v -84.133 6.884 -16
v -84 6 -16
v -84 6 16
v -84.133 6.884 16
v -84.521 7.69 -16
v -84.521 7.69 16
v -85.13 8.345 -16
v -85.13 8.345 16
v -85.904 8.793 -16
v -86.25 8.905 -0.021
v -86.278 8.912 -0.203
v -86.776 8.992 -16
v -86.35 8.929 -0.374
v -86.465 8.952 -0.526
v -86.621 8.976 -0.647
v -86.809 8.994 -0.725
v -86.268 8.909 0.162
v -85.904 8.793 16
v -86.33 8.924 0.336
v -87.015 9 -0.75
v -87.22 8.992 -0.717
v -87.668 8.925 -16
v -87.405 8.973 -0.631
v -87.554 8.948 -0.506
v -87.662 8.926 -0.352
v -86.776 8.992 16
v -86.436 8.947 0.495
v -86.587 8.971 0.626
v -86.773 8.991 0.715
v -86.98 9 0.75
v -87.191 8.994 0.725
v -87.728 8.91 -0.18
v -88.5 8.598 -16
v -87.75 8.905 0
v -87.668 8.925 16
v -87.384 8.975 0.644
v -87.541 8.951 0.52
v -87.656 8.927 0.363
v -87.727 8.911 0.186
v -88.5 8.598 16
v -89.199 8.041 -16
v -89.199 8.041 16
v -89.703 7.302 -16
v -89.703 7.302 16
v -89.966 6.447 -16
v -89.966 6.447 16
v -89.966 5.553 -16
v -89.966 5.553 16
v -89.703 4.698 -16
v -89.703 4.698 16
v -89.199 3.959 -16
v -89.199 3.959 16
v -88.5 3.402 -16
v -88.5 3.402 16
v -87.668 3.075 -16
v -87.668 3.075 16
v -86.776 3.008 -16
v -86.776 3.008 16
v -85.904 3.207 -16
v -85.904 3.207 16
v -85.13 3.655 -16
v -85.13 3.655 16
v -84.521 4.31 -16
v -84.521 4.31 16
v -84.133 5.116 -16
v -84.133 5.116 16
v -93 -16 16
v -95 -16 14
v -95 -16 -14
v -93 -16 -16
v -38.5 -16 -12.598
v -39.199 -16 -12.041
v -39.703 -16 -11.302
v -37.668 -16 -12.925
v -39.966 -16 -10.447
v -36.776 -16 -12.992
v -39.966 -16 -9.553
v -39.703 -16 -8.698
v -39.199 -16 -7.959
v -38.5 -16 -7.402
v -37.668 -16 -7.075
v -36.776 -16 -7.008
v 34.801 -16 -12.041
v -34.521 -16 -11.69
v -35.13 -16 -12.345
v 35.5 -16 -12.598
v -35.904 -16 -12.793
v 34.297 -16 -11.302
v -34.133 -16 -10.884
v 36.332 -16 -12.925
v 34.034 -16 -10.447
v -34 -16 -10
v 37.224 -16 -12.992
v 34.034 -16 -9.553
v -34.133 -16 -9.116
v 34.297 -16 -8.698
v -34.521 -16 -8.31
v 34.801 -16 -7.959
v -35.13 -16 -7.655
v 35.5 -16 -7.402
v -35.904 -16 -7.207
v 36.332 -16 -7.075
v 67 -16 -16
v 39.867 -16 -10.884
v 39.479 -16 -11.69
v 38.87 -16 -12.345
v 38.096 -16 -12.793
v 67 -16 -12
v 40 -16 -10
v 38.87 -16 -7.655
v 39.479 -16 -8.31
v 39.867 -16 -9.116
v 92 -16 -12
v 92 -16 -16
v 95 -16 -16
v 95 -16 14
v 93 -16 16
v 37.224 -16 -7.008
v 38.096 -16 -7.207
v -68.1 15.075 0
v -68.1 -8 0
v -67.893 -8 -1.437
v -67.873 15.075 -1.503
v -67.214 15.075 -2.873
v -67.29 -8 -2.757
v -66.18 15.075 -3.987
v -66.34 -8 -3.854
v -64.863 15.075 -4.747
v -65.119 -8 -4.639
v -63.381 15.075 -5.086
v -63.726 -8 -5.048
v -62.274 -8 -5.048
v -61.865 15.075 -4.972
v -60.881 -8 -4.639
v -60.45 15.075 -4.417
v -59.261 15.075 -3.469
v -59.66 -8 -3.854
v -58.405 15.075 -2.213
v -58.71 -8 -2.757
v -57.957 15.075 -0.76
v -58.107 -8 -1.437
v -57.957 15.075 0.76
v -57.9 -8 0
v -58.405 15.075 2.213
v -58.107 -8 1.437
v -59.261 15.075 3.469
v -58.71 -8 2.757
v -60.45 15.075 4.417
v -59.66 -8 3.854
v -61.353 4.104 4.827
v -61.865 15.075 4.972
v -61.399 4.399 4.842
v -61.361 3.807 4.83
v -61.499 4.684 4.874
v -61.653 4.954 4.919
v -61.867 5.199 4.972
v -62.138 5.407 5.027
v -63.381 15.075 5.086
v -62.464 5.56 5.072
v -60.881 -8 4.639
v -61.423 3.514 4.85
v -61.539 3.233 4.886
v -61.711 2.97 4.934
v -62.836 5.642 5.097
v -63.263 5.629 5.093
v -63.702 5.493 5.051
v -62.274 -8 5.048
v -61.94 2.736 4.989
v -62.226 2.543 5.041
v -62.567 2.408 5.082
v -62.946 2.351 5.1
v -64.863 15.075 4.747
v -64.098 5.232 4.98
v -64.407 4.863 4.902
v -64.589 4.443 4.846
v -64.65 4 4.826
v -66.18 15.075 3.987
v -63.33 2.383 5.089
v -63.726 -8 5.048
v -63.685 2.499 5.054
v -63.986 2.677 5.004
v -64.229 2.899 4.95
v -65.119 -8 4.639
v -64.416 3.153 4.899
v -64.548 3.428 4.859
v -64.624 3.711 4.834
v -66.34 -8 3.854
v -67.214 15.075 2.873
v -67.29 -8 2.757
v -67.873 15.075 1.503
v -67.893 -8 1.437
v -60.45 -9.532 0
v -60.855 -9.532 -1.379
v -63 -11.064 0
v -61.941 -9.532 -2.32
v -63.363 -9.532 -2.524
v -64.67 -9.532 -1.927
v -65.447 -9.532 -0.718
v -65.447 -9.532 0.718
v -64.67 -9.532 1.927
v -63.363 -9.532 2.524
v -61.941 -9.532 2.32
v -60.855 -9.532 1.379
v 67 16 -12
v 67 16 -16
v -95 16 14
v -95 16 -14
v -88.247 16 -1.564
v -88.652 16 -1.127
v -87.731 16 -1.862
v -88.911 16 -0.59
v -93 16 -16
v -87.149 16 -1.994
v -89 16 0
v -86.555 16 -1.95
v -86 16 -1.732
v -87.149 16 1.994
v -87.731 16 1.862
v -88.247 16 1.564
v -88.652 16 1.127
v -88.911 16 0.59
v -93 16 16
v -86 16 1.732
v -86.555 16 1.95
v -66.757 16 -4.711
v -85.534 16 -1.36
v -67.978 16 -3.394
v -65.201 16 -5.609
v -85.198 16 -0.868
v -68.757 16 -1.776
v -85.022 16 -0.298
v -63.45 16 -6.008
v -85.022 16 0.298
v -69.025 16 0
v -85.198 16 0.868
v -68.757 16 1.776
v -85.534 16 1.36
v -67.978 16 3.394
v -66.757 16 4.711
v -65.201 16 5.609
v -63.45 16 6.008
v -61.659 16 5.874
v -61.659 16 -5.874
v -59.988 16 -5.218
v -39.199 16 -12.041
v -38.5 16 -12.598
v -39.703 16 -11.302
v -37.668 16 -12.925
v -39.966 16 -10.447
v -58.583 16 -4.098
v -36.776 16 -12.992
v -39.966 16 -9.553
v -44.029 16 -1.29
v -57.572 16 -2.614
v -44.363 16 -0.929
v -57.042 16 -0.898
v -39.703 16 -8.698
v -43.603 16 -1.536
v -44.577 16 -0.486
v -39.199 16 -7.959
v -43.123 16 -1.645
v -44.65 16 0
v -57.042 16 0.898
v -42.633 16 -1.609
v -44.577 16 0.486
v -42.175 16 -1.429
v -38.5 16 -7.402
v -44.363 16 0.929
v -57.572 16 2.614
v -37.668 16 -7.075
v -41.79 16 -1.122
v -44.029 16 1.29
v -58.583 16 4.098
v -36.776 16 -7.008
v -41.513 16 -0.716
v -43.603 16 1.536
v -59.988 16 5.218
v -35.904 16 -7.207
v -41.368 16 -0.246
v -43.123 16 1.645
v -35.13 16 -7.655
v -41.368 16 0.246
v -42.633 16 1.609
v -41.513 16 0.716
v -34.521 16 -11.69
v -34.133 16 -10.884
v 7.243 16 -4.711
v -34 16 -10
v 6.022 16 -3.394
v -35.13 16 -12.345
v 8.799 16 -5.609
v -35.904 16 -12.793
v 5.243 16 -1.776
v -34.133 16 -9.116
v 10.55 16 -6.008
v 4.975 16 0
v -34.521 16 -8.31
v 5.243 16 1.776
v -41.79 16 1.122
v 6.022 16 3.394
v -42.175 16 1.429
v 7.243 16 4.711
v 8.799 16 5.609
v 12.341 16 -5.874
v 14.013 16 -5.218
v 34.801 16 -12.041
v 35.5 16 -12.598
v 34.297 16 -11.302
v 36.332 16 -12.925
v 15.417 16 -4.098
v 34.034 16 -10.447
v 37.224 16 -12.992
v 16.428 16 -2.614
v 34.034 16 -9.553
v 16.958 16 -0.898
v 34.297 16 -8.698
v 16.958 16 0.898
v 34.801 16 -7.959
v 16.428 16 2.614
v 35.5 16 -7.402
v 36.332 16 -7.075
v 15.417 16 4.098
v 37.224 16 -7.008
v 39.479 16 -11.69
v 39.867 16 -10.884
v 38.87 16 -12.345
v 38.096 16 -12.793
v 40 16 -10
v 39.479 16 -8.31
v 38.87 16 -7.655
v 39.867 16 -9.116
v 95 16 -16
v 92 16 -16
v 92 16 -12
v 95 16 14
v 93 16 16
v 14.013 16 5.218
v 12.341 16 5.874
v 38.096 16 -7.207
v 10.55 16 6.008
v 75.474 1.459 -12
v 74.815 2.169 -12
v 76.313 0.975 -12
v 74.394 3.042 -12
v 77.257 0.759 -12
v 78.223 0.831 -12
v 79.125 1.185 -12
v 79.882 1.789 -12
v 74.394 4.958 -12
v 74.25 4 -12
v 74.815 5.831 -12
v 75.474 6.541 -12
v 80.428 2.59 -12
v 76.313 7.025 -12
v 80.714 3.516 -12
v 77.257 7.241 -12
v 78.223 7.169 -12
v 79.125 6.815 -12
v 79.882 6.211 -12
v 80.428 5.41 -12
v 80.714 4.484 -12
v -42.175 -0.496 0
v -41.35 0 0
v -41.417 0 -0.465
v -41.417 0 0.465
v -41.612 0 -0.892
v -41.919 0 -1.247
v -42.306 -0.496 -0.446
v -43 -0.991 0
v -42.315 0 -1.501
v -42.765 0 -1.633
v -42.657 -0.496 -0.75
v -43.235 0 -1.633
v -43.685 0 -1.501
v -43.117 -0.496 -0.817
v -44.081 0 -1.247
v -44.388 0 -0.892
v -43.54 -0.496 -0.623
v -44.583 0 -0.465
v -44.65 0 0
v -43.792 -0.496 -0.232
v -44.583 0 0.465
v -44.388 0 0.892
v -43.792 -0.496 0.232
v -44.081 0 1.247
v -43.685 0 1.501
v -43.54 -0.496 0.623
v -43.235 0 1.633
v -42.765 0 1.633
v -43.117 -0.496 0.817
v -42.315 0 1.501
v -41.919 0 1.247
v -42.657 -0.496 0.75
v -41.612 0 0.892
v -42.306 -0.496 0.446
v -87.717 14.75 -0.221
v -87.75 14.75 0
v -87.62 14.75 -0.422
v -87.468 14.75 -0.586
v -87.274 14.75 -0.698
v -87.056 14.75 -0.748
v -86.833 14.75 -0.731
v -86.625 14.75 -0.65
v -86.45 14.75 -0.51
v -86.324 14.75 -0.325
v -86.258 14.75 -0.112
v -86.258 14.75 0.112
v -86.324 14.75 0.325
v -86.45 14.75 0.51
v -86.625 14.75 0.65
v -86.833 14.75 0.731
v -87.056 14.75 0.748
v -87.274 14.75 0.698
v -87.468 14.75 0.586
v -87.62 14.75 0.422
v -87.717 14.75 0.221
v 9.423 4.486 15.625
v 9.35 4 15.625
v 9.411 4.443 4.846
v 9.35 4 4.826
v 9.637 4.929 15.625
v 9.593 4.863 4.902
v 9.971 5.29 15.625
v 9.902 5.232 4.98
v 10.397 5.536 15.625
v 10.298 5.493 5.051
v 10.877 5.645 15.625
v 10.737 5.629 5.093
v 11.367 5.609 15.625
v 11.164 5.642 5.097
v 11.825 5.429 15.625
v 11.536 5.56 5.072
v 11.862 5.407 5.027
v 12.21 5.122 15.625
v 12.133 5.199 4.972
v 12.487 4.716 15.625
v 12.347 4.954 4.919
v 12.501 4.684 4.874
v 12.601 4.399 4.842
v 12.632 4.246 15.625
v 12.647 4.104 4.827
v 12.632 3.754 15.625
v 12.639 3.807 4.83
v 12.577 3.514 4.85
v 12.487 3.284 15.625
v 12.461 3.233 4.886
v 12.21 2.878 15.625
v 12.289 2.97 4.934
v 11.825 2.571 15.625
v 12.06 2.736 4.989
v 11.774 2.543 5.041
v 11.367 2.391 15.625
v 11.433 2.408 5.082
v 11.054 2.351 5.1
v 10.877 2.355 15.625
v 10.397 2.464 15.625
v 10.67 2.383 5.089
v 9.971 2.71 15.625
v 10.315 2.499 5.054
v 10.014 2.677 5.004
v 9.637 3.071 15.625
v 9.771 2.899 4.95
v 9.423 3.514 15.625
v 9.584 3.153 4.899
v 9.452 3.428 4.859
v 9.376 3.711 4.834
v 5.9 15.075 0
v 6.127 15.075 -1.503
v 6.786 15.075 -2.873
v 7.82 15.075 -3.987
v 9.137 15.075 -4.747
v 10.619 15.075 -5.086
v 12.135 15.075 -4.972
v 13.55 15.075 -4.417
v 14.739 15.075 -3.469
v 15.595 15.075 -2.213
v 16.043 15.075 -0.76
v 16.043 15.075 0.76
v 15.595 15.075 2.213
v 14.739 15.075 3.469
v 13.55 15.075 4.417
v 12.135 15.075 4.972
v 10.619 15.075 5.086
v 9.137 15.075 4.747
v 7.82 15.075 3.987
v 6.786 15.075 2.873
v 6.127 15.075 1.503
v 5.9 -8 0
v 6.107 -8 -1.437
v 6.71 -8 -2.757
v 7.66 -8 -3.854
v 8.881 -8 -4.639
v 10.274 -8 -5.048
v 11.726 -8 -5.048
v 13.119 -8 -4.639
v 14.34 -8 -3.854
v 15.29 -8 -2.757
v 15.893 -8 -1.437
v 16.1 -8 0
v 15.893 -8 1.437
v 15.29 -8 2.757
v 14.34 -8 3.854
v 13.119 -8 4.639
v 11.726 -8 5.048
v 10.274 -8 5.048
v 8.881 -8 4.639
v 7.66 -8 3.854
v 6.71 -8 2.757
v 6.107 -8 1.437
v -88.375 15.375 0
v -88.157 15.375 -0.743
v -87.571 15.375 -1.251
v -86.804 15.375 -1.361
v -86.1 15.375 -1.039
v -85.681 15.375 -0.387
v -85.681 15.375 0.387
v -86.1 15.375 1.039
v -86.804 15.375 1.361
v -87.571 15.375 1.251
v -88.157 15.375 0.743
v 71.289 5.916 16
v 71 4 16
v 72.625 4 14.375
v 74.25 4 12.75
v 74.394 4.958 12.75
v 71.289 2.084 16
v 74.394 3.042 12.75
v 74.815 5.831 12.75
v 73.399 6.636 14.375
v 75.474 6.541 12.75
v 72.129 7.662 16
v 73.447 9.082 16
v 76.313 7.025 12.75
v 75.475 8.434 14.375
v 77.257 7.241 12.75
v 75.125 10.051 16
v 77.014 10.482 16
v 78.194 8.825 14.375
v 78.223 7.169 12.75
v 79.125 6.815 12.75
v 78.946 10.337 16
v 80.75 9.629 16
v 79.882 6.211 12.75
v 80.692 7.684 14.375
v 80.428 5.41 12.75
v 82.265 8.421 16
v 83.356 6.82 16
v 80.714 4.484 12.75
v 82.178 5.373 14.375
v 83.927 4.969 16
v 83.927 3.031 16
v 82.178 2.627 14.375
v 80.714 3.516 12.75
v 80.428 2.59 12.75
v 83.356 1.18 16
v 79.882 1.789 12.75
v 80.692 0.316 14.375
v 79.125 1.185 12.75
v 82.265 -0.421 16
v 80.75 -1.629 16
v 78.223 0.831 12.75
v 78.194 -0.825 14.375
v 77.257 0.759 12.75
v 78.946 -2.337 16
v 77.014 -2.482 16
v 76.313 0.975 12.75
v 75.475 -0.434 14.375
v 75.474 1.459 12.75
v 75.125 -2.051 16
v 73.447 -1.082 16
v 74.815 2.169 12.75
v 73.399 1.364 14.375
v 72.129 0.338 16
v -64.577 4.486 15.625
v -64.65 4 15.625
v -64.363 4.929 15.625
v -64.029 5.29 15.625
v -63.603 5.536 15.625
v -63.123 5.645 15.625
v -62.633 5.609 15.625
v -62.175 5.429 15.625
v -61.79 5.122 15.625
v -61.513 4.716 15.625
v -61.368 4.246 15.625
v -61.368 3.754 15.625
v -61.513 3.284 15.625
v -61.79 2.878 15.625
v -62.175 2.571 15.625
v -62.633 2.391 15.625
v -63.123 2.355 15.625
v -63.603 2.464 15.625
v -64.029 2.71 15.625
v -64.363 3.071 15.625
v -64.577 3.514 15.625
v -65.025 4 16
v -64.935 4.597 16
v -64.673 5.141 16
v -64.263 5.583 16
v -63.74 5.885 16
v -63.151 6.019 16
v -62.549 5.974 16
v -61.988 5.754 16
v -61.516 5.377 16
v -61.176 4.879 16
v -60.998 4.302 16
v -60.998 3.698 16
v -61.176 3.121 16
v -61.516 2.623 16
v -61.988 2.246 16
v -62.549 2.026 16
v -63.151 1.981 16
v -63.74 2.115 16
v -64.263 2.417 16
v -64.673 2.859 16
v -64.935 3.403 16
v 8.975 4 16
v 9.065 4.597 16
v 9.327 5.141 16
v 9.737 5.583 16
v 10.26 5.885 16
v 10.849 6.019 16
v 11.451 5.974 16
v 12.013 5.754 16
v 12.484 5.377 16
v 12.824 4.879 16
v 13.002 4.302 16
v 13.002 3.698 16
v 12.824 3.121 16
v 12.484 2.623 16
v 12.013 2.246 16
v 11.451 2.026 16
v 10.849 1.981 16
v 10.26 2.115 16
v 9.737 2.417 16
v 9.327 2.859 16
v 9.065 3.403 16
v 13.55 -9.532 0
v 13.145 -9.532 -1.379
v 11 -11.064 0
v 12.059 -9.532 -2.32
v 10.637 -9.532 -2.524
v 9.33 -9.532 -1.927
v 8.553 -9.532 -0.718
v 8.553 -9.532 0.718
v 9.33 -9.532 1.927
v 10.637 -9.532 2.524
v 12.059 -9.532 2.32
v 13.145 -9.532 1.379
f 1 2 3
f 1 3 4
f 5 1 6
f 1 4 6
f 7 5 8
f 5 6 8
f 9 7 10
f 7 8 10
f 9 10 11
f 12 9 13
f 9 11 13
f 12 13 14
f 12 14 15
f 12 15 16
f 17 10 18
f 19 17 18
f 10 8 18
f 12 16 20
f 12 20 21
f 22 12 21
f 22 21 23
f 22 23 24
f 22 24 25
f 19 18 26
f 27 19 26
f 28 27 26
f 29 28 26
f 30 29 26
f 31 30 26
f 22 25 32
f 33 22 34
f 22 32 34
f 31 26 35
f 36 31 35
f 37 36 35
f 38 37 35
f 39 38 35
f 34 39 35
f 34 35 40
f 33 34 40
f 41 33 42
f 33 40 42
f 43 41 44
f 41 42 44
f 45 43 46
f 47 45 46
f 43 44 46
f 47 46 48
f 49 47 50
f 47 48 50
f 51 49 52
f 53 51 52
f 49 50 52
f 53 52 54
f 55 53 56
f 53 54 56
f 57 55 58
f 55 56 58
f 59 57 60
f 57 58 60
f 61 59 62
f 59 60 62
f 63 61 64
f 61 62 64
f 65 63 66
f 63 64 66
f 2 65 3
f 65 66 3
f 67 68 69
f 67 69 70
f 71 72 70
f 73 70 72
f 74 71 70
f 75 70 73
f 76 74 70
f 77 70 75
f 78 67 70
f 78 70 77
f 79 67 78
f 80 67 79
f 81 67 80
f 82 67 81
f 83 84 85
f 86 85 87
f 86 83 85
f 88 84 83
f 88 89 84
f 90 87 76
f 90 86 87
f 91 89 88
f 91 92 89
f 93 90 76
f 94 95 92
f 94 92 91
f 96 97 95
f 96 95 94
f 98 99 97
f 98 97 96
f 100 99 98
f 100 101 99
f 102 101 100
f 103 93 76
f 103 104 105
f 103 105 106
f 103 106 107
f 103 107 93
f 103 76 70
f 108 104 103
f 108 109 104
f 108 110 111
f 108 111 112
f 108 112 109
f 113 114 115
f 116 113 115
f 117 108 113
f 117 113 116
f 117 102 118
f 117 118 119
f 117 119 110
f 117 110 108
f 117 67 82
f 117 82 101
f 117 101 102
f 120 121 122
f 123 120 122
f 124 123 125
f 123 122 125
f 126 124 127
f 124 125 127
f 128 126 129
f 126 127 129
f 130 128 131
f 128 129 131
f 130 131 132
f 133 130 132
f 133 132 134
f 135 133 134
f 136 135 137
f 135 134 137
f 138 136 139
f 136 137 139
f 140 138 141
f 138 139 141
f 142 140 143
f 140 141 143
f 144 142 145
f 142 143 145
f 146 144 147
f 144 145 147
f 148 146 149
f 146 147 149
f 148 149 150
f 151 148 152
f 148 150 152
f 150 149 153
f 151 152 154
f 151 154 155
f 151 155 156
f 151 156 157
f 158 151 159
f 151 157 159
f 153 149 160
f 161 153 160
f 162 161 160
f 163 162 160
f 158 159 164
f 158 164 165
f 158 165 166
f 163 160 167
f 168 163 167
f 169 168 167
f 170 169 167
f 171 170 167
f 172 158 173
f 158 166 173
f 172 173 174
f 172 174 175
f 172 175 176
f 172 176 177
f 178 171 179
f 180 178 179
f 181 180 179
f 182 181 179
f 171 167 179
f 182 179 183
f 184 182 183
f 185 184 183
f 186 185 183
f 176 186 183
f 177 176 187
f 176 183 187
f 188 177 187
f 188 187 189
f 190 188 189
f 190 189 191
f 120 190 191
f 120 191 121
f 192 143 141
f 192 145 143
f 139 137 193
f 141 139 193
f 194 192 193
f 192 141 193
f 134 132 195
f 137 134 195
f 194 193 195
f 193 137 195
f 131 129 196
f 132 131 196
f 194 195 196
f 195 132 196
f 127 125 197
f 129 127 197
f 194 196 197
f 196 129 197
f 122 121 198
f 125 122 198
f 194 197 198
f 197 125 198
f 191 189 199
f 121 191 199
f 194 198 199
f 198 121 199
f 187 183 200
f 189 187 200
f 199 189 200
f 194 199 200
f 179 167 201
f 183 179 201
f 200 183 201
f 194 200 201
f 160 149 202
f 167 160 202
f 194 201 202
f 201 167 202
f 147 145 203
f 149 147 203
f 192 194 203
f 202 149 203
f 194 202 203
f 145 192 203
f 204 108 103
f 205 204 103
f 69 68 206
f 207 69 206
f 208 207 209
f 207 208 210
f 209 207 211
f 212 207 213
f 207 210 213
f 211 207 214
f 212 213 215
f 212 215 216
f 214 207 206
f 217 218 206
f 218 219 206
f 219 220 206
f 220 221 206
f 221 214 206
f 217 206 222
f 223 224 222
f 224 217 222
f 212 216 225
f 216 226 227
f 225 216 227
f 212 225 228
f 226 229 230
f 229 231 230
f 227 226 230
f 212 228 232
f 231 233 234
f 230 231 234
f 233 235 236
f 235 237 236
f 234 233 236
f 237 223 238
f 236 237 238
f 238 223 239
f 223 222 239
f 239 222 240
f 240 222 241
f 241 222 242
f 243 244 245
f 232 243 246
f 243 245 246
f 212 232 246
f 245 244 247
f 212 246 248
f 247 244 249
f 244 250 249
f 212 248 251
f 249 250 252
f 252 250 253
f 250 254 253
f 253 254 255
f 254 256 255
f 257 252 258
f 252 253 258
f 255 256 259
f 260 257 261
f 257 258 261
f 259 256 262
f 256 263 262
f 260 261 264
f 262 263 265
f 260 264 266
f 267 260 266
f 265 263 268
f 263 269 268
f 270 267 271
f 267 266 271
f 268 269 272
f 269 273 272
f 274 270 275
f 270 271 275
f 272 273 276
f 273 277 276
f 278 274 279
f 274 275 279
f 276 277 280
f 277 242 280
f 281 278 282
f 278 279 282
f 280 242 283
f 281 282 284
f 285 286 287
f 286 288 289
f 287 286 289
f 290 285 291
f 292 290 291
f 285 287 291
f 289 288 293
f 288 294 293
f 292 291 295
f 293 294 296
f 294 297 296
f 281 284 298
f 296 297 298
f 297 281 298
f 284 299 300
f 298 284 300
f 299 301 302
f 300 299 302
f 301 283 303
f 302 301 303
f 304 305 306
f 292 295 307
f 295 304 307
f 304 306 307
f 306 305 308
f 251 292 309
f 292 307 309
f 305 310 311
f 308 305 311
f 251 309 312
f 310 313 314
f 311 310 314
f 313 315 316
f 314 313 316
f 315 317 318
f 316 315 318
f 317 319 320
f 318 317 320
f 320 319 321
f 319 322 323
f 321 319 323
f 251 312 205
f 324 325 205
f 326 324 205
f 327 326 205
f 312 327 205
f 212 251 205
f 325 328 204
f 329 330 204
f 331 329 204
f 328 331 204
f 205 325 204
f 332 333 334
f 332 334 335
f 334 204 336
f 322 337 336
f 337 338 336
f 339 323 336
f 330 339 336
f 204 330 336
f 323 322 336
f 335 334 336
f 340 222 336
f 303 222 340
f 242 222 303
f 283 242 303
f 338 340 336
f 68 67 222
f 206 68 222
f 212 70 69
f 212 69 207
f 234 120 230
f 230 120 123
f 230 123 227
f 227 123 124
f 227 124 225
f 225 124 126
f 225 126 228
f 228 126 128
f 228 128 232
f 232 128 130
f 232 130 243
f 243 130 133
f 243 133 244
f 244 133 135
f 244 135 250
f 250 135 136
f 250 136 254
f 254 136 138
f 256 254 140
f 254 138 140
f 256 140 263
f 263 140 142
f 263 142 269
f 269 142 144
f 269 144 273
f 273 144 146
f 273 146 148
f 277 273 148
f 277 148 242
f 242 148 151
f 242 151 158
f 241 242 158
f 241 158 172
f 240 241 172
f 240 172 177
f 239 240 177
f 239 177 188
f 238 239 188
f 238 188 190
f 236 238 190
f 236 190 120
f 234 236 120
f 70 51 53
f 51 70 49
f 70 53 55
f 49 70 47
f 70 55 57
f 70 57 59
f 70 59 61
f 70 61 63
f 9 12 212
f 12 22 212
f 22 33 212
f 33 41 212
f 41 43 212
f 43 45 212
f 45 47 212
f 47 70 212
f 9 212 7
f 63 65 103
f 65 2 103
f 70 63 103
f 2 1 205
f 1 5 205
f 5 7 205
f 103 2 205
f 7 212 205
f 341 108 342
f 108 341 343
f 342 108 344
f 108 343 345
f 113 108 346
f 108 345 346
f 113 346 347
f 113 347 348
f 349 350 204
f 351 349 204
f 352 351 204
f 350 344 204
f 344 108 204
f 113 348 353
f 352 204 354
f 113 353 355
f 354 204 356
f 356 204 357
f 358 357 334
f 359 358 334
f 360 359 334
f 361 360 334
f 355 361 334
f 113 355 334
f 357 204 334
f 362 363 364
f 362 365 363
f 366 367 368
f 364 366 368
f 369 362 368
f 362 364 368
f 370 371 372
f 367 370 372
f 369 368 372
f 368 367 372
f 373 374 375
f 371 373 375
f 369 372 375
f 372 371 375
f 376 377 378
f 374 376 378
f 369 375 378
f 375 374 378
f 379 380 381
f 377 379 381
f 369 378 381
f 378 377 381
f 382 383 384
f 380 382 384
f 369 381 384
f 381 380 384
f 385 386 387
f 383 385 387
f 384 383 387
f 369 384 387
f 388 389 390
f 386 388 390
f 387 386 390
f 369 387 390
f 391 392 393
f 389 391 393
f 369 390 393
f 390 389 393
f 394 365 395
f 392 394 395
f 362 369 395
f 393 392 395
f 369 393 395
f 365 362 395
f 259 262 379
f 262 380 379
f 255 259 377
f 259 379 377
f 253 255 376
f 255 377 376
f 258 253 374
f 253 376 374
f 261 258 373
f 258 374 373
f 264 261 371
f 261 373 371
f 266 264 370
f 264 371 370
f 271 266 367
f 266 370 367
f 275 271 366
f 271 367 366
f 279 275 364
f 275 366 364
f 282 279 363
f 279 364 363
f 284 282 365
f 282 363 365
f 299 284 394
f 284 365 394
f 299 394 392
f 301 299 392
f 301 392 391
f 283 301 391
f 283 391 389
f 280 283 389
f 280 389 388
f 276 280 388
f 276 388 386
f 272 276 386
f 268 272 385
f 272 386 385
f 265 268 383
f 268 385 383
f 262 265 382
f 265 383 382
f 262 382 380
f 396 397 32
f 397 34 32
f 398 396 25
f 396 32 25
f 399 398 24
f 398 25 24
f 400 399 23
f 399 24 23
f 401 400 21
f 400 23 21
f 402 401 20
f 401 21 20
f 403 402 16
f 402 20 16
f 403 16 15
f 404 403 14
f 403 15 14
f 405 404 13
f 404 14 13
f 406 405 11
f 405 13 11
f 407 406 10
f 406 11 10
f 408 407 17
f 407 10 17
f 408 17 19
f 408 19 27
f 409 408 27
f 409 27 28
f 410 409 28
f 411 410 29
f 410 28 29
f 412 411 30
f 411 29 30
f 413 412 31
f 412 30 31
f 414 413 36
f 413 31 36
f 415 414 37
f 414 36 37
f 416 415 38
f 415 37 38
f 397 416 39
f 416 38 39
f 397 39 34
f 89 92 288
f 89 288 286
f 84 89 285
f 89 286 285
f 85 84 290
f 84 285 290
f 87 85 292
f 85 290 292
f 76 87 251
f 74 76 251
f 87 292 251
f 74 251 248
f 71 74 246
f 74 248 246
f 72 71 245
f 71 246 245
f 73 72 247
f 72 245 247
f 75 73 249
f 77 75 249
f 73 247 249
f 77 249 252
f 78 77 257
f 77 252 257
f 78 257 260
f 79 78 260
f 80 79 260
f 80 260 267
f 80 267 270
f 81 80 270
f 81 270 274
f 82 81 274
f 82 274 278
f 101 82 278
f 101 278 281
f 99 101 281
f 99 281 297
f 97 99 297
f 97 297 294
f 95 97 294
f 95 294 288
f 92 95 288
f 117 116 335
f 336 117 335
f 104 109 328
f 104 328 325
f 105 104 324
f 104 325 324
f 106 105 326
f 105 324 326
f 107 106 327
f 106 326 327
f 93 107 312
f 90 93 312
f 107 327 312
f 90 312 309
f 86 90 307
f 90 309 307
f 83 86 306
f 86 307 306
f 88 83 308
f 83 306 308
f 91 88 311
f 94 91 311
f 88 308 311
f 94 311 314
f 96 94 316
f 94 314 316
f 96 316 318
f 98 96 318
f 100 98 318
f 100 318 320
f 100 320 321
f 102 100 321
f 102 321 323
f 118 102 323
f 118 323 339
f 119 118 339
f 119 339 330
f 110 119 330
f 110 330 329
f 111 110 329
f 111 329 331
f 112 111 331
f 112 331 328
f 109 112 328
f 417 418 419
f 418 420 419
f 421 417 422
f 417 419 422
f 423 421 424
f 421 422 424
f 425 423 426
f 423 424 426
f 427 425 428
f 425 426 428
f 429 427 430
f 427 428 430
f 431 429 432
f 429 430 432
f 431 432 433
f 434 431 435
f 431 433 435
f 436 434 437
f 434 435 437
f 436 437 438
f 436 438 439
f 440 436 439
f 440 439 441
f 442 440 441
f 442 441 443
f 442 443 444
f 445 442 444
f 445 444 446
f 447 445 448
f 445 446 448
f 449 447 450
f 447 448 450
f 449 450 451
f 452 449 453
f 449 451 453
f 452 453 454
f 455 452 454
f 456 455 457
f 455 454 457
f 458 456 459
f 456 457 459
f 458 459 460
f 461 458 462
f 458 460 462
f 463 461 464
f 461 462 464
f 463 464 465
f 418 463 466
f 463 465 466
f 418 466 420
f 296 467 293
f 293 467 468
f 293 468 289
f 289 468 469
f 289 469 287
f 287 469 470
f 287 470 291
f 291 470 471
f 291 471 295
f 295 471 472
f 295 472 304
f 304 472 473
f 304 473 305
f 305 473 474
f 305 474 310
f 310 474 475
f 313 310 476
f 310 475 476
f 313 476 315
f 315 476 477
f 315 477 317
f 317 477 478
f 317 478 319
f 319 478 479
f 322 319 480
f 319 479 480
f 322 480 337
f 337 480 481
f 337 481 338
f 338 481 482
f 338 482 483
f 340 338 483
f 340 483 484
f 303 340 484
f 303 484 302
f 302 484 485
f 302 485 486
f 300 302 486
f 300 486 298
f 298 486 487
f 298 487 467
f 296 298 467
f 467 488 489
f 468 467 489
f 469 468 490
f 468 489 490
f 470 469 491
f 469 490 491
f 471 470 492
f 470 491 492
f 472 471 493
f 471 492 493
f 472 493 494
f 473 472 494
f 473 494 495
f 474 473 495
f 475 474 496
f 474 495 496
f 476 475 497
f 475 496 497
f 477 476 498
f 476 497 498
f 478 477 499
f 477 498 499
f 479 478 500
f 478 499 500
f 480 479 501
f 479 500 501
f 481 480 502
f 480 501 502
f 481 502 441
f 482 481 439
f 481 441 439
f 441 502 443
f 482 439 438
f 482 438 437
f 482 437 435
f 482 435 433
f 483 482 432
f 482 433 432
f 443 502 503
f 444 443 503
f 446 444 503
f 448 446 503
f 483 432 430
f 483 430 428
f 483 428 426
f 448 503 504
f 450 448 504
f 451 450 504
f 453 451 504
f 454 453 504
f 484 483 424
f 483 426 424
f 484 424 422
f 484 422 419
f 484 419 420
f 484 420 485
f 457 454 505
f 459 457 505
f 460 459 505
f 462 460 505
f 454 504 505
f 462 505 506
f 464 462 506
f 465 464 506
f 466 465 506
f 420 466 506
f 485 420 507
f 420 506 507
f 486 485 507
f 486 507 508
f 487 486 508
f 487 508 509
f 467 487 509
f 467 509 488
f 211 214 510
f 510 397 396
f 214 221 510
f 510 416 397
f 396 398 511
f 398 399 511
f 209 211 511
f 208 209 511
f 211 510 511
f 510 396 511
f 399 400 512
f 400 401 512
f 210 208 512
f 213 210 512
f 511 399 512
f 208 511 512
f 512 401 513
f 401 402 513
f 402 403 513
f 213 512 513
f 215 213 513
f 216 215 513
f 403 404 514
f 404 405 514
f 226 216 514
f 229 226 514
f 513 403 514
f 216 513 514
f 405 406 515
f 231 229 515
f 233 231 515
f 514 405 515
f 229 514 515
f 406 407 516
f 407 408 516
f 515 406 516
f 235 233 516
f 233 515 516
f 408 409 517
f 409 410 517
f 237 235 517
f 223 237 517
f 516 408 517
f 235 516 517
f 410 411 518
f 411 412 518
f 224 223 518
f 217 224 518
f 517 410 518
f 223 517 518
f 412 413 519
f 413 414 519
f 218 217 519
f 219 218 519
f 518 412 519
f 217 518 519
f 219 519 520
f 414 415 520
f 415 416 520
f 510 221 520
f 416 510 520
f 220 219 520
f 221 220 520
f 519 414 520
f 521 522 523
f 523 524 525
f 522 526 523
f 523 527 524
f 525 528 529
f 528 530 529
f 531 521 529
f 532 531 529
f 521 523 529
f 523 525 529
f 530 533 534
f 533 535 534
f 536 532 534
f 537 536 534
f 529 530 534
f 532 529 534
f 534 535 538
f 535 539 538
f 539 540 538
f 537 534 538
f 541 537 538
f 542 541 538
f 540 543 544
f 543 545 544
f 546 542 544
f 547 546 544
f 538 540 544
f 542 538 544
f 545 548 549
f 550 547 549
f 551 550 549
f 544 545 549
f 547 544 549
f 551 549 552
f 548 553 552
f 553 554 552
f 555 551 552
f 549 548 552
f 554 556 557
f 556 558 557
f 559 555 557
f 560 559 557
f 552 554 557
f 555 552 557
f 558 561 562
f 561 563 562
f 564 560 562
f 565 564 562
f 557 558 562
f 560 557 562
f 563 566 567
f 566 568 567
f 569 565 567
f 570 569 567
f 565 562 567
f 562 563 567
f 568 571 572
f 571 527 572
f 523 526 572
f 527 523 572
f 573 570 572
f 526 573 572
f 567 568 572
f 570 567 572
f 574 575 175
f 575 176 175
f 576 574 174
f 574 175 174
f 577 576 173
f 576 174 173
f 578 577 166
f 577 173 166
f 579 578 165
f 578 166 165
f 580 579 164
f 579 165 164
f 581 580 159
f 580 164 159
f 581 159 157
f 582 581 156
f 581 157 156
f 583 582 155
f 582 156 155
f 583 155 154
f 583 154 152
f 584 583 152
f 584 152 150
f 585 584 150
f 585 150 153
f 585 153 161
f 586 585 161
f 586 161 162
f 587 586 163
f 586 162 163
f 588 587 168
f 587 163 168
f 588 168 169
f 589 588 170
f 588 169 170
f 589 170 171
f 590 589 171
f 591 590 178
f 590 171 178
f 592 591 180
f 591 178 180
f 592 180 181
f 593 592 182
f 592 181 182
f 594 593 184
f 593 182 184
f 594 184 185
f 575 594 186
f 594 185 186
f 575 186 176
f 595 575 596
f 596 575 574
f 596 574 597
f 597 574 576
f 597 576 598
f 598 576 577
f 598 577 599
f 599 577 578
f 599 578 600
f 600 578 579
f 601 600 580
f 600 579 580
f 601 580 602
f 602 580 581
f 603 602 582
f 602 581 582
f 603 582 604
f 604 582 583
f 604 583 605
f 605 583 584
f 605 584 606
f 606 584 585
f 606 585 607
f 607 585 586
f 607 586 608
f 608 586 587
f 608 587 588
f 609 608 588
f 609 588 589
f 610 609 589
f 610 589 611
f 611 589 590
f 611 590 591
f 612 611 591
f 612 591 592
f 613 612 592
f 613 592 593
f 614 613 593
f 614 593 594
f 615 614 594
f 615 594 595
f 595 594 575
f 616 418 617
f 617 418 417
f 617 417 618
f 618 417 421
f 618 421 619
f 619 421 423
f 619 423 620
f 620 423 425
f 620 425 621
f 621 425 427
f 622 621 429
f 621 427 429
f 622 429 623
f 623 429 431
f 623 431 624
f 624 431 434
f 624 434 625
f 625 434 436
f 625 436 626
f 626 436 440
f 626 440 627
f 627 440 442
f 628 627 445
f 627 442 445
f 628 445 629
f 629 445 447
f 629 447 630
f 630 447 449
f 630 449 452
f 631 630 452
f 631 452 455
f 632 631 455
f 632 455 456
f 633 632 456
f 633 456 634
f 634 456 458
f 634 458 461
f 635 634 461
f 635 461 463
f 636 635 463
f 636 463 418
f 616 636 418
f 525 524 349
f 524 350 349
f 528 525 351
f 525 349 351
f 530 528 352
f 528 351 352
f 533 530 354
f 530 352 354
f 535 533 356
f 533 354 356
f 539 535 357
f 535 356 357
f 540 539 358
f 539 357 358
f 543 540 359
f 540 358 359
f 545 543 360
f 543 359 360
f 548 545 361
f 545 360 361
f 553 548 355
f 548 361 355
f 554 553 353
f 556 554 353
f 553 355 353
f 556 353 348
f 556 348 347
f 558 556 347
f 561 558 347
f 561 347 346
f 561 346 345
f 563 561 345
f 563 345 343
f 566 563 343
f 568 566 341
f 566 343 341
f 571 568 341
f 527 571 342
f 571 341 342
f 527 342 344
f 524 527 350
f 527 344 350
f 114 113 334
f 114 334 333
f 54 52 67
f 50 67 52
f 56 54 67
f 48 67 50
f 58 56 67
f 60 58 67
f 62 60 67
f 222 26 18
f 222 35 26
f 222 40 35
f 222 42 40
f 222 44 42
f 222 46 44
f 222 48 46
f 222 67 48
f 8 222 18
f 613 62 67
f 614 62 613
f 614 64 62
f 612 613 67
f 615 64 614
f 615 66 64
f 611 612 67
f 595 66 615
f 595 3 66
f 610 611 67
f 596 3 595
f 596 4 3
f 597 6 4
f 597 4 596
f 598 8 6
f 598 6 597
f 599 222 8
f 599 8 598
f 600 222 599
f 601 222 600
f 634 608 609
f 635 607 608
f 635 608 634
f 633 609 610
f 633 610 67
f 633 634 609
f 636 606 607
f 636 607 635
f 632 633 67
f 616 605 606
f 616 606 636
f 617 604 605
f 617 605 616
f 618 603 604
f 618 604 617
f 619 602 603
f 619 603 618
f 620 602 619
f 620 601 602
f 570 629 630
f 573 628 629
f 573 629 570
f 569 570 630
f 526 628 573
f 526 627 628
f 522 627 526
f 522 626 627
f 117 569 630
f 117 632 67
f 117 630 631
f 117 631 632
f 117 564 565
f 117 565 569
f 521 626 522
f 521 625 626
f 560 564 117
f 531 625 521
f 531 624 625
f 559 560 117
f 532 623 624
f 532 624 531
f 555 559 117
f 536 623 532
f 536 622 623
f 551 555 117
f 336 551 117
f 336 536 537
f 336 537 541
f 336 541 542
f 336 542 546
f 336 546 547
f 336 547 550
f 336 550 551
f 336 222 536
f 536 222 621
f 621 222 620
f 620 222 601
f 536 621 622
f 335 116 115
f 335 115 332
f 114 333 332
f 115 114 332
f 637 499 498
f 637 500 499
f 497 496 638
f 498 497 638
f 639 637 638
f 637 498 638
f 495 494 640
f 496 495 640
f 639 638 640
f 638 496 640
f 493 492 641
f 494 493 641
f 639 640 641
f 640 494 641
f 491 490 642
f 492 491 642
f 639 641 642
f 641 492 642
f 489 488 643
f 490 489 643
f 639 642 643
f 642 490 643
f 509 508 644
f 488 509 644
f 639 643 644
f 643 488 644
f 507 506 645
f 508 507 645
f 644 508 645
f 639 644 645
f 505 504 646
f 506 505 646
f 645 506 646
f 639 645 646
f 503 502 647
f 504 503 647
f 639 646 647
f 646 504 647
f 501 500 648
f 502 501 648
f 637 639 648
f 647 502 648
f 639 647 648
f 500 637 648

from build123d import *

# Parameters (mm, degrees)
SKETCH1_W                                            = 190
SKETCH1_H                                            = 32
BOSS_EXTRUDE1_DEPTH                                  = 16
CHAMFER1_SIZE                                        = 2
SKETCH2_W                                            = 25
SKETCH2_H                                            = 4
CUT_EXTRUDE1_DEPTH                                   = 33
M12_TAPPED_HOLE1_D                                   = 10.2
M12_TAPPED_HOLE1_DEPTH                               = 24
M12_TAPPED_HOLE1_CSINK_D                             = 12.05
M12_TAPPED_HOLE1_CSINK_ANGLE                         = 90
M12_TAPPED_HOLE1_TIP                                 = 3.064389157
M4_TAPPED_HOLE1_D                                    = 3.3
M4_TAPPED_HOLE1_DEPTH                                = 11.5
M4_TAPPED_HOLE1_CSINK_D                              = 4.05
M4_TAPPED_HOLE1_CSINK_ANGLE                          = 90
M4_TAPPED_HOLE1_TIP                                  = 0.991420021
CSK_FOR_M10_COUNTERSUNK_FLAT_HEAD_SCREW1_D           = 6.5
CSK_FOR_M10_COUNTERSUNK_FLAT_HEAD_SCREW1_CSINK_D     = 13
CSK_FOR_M10_COUNTERSUNK_FLAT_HEAD_SCREW1_CSINK_ANGLE = 90
SKETCH12_R                                           = 3
CUT_EXTRUDE2_DEPTH                                   = 33
CSK_FOR_M4_COUNTERSUNK_FLAT_HEAD_SCREW1_D            = 1.5
CSK_FOR_M4_COUNTERSUNK_FLAT_HEAD_SCREW1_DEPTH        = 11.5
CSK_FOR_M4_COUNTERSUNK_FLAT_HEAD_SCREW1_CSINK_D      = 4
CSK_FOR_M4_COUNTERSUNK_FLAT_HEAD_SCREW1_CSINK_ANGLE  = 90
CSK_FOR_M4_COUNTERSUNK_FLAT_HEAD_SCREW1_TIP          = 0.450645464
M4_TAPPED_HOLE2_D                                    = 3.3
M4_TAPPED_HOLE2_DEPTH                                = 16
M4_TAPPED_HOLE2_TIP                                  = 0.991420021
SKETCH19_R                                           = 3
CUT_EXTRUDE3_DEPTH                                   = 33


with BuildPart() as part:
    # Sketch1 → Boss-Extrude1 (new body, symmetric)
    with BuildSketch(Plane.XY):
        Rectangle(SKETCH1_W, SKETCH1_H)
    extrude(amount=BOSS_EXTRUDE1_DEPTH, both=True)

    # Chamfer1
    chamfer1_edges = [part.edges().sort_by_distance(p)[0] for p in [
        (-95, 0, 16),
        (95, 0, 16),
        (-95, 0, -16),
    ]]
    chamfer(chamfer1_edges, length=CHAMFER1_SIZE)

    # Sketch2 → Cut-Extrude1 (cut, through all)
    with BuildSketch(Plane(origin=(0, 16, 0), x_dir=(1, 0, 0), z_dir=(0, 1, 0))):
        with Locations((79.5, 14)):
            Rectangle(SKETCH2_W, SKETCH2_H)
    extrude(amount=-CUT_EXTRUDE1_DEPTH, mode=Mode.SUBTRACT)

    # M12 Tapped Hole1
    with Locations(Plane(origin=(0, 16, 0), x_dir=(1, 0, 0), z_dir=(0, 1, 0))):
        with Locations((-63, 0), (11, 0)):
            CounterSinkHole(M12_TAPPED_HOLE1_D / 2, M12_TAPPED_HOLE1_CSINK_D / 2, depth=M12_TAPPED_HOLE1_DEPTH, counter_sink_angle=M12_TAPPED_HOLE1_CSINK_ANGLE)
            with Locations((0, 0, -(M12_TAPPED_HOLE1_DEPTH + M12_TAPPED_HOLE1_TIP / 2))):  # 118° drill point
                Cone(0, M12_TAPPED_HOLE1_D / 2, M12_TAPPED_HOLE1_TIP, mode=Mode.SUBTRACT)

    # M4 Tapped Hole1
    with Locations(Plane.XY.offset(16)):
        with Locations((-63, 4), (11, 4)):
            CounterSinkHole(M4_TAPPED_HOLE1_D / 2, M4_TAPPED_HOLE1_CSINK_D / 2, depth=M4_TAPPED_HOLE1_DEPTH, counter_sink_angle=M4_TAPPED_HOLE1_CSINK_ANGLE)
            with Locations((0, 0, -(M4_TAPPED_HOLE1_DEPTH + M4_TAPPED_HOLE1_TIP / 2))):  # 118° drill point
                Cone(0, M4_TAPPED_HOLE1_D / 2, M4_TAPPED_HOLE1_TIP, mode=Mode.SUBTRACT)

    # CSK for M10 Countersunk Flat Head Screw1 (through all)
    with Locations(Plane.XY.offset(16)):
        with Locations((77.5, 4)):
            CounterSinkHole(CSK_FOR_M10_COUNTERSUNK_FLAT_HEAD_SCREW1_D / 2, CSK_FOR_M10_COUNTERSUNK_FLAT_HEAD_SCREW1_CSINK_D / 2, counter_sink_angle=CSK_FOR_M10_COUNTERSUNK_FLAT_HEAD_SCREW1_CSINK_ANGLE)

    # Sketch12 → Cut-Extrude2 (cut, through all)
    with BuildSketch(Plane.XY.offset(16)):
        with Locations((-87, 6)):
            Circle(SKETCH12_R)
    extrude(amount=-CUT_EXTRUDE2_DEPTH, mode=Mode.SUBTRACT)

    # CSK for M4 Countersunk Flat Head Screw1
    with Locations(Plane(origin=(0, 16, 0), x_dir=(1, 0, 0), z_dir=(0, 1, 0))):
        with Locations((-87, 0)):
            CounterSinkHole(CSK_FOR_M4_COUNTERSUNK_FLAT_HEAD_SCREW1_D / 2, CSK_FOR_M4_COUNTERSUNK_FLAT_HEAD_SCREW1_CSINK_D / 2, depth=CSK_FOR_M4_COUNTERSUNK_FLAT_HEAD_SCREW1_DEPTH, counter_sink_angle=CSK_FOR_M4_COUNTERSUNK_FLAT_HEAD_SCREW1_CSINK_ANGLE)
            with Locations((0, 0, -(CSK_FOR_M4_COUNTERSUNK_FLAT_HEAD_SCREW1_DEPTH + CSK_FOR_M4_COUNTERSUNK_FLAT_HEAD_SCREW1_TIP / 2))):  # 118° drill point
                Cone(0, CSK_FOR_M4_COUNTERSUNK_FLAT_HEAD_SCREW1_D / 2, CSK_FOR_M4_COUNTERSUNK_FLAT_HEAD_SCREW1_TIP, mode=Mode.SUBTRACT)

    # M4 Tapped Hole2
    with Locations(Plane(origin=(0, 16, 0), x_dir=(1, 0, 0), z_dir=(0, 1, 0))):
        with Locations((-43, 0)):
            Hole(M4_TAPPED_HOLE2_D / 2, depth=M4_TAPPED_HOLE2_DEPTH)
            with Locations((0, 0, -(M4_TAPPED_HOLE2_DEPTH + M4_TAPPED_HOLE2_TIP / 2))):  # 118° drill point
                Cone(0, M4_TAPPED_HOLE2_D / 2, M4_TAPPED_HOLE2_TIP, mode=Mode.SUBTRACT)

    # Sketch19 → Cut-Extrude3 (cut, through all)
    with BuildSketch(Plane(origin=(0, 16, 0), x_dir=(1, 0, 0), z_dir=(0, 1, 0))):
        with Locations((-37, 10)):
            Circle(SKETCH19_R)
        with Locations((37, 10)):
            Circle(SKETCH19_R)
    extrude(amount=-CUT_EXTRUDE3_DEPTH, mode=Mode.SUBTRACT)


solid = part.part
